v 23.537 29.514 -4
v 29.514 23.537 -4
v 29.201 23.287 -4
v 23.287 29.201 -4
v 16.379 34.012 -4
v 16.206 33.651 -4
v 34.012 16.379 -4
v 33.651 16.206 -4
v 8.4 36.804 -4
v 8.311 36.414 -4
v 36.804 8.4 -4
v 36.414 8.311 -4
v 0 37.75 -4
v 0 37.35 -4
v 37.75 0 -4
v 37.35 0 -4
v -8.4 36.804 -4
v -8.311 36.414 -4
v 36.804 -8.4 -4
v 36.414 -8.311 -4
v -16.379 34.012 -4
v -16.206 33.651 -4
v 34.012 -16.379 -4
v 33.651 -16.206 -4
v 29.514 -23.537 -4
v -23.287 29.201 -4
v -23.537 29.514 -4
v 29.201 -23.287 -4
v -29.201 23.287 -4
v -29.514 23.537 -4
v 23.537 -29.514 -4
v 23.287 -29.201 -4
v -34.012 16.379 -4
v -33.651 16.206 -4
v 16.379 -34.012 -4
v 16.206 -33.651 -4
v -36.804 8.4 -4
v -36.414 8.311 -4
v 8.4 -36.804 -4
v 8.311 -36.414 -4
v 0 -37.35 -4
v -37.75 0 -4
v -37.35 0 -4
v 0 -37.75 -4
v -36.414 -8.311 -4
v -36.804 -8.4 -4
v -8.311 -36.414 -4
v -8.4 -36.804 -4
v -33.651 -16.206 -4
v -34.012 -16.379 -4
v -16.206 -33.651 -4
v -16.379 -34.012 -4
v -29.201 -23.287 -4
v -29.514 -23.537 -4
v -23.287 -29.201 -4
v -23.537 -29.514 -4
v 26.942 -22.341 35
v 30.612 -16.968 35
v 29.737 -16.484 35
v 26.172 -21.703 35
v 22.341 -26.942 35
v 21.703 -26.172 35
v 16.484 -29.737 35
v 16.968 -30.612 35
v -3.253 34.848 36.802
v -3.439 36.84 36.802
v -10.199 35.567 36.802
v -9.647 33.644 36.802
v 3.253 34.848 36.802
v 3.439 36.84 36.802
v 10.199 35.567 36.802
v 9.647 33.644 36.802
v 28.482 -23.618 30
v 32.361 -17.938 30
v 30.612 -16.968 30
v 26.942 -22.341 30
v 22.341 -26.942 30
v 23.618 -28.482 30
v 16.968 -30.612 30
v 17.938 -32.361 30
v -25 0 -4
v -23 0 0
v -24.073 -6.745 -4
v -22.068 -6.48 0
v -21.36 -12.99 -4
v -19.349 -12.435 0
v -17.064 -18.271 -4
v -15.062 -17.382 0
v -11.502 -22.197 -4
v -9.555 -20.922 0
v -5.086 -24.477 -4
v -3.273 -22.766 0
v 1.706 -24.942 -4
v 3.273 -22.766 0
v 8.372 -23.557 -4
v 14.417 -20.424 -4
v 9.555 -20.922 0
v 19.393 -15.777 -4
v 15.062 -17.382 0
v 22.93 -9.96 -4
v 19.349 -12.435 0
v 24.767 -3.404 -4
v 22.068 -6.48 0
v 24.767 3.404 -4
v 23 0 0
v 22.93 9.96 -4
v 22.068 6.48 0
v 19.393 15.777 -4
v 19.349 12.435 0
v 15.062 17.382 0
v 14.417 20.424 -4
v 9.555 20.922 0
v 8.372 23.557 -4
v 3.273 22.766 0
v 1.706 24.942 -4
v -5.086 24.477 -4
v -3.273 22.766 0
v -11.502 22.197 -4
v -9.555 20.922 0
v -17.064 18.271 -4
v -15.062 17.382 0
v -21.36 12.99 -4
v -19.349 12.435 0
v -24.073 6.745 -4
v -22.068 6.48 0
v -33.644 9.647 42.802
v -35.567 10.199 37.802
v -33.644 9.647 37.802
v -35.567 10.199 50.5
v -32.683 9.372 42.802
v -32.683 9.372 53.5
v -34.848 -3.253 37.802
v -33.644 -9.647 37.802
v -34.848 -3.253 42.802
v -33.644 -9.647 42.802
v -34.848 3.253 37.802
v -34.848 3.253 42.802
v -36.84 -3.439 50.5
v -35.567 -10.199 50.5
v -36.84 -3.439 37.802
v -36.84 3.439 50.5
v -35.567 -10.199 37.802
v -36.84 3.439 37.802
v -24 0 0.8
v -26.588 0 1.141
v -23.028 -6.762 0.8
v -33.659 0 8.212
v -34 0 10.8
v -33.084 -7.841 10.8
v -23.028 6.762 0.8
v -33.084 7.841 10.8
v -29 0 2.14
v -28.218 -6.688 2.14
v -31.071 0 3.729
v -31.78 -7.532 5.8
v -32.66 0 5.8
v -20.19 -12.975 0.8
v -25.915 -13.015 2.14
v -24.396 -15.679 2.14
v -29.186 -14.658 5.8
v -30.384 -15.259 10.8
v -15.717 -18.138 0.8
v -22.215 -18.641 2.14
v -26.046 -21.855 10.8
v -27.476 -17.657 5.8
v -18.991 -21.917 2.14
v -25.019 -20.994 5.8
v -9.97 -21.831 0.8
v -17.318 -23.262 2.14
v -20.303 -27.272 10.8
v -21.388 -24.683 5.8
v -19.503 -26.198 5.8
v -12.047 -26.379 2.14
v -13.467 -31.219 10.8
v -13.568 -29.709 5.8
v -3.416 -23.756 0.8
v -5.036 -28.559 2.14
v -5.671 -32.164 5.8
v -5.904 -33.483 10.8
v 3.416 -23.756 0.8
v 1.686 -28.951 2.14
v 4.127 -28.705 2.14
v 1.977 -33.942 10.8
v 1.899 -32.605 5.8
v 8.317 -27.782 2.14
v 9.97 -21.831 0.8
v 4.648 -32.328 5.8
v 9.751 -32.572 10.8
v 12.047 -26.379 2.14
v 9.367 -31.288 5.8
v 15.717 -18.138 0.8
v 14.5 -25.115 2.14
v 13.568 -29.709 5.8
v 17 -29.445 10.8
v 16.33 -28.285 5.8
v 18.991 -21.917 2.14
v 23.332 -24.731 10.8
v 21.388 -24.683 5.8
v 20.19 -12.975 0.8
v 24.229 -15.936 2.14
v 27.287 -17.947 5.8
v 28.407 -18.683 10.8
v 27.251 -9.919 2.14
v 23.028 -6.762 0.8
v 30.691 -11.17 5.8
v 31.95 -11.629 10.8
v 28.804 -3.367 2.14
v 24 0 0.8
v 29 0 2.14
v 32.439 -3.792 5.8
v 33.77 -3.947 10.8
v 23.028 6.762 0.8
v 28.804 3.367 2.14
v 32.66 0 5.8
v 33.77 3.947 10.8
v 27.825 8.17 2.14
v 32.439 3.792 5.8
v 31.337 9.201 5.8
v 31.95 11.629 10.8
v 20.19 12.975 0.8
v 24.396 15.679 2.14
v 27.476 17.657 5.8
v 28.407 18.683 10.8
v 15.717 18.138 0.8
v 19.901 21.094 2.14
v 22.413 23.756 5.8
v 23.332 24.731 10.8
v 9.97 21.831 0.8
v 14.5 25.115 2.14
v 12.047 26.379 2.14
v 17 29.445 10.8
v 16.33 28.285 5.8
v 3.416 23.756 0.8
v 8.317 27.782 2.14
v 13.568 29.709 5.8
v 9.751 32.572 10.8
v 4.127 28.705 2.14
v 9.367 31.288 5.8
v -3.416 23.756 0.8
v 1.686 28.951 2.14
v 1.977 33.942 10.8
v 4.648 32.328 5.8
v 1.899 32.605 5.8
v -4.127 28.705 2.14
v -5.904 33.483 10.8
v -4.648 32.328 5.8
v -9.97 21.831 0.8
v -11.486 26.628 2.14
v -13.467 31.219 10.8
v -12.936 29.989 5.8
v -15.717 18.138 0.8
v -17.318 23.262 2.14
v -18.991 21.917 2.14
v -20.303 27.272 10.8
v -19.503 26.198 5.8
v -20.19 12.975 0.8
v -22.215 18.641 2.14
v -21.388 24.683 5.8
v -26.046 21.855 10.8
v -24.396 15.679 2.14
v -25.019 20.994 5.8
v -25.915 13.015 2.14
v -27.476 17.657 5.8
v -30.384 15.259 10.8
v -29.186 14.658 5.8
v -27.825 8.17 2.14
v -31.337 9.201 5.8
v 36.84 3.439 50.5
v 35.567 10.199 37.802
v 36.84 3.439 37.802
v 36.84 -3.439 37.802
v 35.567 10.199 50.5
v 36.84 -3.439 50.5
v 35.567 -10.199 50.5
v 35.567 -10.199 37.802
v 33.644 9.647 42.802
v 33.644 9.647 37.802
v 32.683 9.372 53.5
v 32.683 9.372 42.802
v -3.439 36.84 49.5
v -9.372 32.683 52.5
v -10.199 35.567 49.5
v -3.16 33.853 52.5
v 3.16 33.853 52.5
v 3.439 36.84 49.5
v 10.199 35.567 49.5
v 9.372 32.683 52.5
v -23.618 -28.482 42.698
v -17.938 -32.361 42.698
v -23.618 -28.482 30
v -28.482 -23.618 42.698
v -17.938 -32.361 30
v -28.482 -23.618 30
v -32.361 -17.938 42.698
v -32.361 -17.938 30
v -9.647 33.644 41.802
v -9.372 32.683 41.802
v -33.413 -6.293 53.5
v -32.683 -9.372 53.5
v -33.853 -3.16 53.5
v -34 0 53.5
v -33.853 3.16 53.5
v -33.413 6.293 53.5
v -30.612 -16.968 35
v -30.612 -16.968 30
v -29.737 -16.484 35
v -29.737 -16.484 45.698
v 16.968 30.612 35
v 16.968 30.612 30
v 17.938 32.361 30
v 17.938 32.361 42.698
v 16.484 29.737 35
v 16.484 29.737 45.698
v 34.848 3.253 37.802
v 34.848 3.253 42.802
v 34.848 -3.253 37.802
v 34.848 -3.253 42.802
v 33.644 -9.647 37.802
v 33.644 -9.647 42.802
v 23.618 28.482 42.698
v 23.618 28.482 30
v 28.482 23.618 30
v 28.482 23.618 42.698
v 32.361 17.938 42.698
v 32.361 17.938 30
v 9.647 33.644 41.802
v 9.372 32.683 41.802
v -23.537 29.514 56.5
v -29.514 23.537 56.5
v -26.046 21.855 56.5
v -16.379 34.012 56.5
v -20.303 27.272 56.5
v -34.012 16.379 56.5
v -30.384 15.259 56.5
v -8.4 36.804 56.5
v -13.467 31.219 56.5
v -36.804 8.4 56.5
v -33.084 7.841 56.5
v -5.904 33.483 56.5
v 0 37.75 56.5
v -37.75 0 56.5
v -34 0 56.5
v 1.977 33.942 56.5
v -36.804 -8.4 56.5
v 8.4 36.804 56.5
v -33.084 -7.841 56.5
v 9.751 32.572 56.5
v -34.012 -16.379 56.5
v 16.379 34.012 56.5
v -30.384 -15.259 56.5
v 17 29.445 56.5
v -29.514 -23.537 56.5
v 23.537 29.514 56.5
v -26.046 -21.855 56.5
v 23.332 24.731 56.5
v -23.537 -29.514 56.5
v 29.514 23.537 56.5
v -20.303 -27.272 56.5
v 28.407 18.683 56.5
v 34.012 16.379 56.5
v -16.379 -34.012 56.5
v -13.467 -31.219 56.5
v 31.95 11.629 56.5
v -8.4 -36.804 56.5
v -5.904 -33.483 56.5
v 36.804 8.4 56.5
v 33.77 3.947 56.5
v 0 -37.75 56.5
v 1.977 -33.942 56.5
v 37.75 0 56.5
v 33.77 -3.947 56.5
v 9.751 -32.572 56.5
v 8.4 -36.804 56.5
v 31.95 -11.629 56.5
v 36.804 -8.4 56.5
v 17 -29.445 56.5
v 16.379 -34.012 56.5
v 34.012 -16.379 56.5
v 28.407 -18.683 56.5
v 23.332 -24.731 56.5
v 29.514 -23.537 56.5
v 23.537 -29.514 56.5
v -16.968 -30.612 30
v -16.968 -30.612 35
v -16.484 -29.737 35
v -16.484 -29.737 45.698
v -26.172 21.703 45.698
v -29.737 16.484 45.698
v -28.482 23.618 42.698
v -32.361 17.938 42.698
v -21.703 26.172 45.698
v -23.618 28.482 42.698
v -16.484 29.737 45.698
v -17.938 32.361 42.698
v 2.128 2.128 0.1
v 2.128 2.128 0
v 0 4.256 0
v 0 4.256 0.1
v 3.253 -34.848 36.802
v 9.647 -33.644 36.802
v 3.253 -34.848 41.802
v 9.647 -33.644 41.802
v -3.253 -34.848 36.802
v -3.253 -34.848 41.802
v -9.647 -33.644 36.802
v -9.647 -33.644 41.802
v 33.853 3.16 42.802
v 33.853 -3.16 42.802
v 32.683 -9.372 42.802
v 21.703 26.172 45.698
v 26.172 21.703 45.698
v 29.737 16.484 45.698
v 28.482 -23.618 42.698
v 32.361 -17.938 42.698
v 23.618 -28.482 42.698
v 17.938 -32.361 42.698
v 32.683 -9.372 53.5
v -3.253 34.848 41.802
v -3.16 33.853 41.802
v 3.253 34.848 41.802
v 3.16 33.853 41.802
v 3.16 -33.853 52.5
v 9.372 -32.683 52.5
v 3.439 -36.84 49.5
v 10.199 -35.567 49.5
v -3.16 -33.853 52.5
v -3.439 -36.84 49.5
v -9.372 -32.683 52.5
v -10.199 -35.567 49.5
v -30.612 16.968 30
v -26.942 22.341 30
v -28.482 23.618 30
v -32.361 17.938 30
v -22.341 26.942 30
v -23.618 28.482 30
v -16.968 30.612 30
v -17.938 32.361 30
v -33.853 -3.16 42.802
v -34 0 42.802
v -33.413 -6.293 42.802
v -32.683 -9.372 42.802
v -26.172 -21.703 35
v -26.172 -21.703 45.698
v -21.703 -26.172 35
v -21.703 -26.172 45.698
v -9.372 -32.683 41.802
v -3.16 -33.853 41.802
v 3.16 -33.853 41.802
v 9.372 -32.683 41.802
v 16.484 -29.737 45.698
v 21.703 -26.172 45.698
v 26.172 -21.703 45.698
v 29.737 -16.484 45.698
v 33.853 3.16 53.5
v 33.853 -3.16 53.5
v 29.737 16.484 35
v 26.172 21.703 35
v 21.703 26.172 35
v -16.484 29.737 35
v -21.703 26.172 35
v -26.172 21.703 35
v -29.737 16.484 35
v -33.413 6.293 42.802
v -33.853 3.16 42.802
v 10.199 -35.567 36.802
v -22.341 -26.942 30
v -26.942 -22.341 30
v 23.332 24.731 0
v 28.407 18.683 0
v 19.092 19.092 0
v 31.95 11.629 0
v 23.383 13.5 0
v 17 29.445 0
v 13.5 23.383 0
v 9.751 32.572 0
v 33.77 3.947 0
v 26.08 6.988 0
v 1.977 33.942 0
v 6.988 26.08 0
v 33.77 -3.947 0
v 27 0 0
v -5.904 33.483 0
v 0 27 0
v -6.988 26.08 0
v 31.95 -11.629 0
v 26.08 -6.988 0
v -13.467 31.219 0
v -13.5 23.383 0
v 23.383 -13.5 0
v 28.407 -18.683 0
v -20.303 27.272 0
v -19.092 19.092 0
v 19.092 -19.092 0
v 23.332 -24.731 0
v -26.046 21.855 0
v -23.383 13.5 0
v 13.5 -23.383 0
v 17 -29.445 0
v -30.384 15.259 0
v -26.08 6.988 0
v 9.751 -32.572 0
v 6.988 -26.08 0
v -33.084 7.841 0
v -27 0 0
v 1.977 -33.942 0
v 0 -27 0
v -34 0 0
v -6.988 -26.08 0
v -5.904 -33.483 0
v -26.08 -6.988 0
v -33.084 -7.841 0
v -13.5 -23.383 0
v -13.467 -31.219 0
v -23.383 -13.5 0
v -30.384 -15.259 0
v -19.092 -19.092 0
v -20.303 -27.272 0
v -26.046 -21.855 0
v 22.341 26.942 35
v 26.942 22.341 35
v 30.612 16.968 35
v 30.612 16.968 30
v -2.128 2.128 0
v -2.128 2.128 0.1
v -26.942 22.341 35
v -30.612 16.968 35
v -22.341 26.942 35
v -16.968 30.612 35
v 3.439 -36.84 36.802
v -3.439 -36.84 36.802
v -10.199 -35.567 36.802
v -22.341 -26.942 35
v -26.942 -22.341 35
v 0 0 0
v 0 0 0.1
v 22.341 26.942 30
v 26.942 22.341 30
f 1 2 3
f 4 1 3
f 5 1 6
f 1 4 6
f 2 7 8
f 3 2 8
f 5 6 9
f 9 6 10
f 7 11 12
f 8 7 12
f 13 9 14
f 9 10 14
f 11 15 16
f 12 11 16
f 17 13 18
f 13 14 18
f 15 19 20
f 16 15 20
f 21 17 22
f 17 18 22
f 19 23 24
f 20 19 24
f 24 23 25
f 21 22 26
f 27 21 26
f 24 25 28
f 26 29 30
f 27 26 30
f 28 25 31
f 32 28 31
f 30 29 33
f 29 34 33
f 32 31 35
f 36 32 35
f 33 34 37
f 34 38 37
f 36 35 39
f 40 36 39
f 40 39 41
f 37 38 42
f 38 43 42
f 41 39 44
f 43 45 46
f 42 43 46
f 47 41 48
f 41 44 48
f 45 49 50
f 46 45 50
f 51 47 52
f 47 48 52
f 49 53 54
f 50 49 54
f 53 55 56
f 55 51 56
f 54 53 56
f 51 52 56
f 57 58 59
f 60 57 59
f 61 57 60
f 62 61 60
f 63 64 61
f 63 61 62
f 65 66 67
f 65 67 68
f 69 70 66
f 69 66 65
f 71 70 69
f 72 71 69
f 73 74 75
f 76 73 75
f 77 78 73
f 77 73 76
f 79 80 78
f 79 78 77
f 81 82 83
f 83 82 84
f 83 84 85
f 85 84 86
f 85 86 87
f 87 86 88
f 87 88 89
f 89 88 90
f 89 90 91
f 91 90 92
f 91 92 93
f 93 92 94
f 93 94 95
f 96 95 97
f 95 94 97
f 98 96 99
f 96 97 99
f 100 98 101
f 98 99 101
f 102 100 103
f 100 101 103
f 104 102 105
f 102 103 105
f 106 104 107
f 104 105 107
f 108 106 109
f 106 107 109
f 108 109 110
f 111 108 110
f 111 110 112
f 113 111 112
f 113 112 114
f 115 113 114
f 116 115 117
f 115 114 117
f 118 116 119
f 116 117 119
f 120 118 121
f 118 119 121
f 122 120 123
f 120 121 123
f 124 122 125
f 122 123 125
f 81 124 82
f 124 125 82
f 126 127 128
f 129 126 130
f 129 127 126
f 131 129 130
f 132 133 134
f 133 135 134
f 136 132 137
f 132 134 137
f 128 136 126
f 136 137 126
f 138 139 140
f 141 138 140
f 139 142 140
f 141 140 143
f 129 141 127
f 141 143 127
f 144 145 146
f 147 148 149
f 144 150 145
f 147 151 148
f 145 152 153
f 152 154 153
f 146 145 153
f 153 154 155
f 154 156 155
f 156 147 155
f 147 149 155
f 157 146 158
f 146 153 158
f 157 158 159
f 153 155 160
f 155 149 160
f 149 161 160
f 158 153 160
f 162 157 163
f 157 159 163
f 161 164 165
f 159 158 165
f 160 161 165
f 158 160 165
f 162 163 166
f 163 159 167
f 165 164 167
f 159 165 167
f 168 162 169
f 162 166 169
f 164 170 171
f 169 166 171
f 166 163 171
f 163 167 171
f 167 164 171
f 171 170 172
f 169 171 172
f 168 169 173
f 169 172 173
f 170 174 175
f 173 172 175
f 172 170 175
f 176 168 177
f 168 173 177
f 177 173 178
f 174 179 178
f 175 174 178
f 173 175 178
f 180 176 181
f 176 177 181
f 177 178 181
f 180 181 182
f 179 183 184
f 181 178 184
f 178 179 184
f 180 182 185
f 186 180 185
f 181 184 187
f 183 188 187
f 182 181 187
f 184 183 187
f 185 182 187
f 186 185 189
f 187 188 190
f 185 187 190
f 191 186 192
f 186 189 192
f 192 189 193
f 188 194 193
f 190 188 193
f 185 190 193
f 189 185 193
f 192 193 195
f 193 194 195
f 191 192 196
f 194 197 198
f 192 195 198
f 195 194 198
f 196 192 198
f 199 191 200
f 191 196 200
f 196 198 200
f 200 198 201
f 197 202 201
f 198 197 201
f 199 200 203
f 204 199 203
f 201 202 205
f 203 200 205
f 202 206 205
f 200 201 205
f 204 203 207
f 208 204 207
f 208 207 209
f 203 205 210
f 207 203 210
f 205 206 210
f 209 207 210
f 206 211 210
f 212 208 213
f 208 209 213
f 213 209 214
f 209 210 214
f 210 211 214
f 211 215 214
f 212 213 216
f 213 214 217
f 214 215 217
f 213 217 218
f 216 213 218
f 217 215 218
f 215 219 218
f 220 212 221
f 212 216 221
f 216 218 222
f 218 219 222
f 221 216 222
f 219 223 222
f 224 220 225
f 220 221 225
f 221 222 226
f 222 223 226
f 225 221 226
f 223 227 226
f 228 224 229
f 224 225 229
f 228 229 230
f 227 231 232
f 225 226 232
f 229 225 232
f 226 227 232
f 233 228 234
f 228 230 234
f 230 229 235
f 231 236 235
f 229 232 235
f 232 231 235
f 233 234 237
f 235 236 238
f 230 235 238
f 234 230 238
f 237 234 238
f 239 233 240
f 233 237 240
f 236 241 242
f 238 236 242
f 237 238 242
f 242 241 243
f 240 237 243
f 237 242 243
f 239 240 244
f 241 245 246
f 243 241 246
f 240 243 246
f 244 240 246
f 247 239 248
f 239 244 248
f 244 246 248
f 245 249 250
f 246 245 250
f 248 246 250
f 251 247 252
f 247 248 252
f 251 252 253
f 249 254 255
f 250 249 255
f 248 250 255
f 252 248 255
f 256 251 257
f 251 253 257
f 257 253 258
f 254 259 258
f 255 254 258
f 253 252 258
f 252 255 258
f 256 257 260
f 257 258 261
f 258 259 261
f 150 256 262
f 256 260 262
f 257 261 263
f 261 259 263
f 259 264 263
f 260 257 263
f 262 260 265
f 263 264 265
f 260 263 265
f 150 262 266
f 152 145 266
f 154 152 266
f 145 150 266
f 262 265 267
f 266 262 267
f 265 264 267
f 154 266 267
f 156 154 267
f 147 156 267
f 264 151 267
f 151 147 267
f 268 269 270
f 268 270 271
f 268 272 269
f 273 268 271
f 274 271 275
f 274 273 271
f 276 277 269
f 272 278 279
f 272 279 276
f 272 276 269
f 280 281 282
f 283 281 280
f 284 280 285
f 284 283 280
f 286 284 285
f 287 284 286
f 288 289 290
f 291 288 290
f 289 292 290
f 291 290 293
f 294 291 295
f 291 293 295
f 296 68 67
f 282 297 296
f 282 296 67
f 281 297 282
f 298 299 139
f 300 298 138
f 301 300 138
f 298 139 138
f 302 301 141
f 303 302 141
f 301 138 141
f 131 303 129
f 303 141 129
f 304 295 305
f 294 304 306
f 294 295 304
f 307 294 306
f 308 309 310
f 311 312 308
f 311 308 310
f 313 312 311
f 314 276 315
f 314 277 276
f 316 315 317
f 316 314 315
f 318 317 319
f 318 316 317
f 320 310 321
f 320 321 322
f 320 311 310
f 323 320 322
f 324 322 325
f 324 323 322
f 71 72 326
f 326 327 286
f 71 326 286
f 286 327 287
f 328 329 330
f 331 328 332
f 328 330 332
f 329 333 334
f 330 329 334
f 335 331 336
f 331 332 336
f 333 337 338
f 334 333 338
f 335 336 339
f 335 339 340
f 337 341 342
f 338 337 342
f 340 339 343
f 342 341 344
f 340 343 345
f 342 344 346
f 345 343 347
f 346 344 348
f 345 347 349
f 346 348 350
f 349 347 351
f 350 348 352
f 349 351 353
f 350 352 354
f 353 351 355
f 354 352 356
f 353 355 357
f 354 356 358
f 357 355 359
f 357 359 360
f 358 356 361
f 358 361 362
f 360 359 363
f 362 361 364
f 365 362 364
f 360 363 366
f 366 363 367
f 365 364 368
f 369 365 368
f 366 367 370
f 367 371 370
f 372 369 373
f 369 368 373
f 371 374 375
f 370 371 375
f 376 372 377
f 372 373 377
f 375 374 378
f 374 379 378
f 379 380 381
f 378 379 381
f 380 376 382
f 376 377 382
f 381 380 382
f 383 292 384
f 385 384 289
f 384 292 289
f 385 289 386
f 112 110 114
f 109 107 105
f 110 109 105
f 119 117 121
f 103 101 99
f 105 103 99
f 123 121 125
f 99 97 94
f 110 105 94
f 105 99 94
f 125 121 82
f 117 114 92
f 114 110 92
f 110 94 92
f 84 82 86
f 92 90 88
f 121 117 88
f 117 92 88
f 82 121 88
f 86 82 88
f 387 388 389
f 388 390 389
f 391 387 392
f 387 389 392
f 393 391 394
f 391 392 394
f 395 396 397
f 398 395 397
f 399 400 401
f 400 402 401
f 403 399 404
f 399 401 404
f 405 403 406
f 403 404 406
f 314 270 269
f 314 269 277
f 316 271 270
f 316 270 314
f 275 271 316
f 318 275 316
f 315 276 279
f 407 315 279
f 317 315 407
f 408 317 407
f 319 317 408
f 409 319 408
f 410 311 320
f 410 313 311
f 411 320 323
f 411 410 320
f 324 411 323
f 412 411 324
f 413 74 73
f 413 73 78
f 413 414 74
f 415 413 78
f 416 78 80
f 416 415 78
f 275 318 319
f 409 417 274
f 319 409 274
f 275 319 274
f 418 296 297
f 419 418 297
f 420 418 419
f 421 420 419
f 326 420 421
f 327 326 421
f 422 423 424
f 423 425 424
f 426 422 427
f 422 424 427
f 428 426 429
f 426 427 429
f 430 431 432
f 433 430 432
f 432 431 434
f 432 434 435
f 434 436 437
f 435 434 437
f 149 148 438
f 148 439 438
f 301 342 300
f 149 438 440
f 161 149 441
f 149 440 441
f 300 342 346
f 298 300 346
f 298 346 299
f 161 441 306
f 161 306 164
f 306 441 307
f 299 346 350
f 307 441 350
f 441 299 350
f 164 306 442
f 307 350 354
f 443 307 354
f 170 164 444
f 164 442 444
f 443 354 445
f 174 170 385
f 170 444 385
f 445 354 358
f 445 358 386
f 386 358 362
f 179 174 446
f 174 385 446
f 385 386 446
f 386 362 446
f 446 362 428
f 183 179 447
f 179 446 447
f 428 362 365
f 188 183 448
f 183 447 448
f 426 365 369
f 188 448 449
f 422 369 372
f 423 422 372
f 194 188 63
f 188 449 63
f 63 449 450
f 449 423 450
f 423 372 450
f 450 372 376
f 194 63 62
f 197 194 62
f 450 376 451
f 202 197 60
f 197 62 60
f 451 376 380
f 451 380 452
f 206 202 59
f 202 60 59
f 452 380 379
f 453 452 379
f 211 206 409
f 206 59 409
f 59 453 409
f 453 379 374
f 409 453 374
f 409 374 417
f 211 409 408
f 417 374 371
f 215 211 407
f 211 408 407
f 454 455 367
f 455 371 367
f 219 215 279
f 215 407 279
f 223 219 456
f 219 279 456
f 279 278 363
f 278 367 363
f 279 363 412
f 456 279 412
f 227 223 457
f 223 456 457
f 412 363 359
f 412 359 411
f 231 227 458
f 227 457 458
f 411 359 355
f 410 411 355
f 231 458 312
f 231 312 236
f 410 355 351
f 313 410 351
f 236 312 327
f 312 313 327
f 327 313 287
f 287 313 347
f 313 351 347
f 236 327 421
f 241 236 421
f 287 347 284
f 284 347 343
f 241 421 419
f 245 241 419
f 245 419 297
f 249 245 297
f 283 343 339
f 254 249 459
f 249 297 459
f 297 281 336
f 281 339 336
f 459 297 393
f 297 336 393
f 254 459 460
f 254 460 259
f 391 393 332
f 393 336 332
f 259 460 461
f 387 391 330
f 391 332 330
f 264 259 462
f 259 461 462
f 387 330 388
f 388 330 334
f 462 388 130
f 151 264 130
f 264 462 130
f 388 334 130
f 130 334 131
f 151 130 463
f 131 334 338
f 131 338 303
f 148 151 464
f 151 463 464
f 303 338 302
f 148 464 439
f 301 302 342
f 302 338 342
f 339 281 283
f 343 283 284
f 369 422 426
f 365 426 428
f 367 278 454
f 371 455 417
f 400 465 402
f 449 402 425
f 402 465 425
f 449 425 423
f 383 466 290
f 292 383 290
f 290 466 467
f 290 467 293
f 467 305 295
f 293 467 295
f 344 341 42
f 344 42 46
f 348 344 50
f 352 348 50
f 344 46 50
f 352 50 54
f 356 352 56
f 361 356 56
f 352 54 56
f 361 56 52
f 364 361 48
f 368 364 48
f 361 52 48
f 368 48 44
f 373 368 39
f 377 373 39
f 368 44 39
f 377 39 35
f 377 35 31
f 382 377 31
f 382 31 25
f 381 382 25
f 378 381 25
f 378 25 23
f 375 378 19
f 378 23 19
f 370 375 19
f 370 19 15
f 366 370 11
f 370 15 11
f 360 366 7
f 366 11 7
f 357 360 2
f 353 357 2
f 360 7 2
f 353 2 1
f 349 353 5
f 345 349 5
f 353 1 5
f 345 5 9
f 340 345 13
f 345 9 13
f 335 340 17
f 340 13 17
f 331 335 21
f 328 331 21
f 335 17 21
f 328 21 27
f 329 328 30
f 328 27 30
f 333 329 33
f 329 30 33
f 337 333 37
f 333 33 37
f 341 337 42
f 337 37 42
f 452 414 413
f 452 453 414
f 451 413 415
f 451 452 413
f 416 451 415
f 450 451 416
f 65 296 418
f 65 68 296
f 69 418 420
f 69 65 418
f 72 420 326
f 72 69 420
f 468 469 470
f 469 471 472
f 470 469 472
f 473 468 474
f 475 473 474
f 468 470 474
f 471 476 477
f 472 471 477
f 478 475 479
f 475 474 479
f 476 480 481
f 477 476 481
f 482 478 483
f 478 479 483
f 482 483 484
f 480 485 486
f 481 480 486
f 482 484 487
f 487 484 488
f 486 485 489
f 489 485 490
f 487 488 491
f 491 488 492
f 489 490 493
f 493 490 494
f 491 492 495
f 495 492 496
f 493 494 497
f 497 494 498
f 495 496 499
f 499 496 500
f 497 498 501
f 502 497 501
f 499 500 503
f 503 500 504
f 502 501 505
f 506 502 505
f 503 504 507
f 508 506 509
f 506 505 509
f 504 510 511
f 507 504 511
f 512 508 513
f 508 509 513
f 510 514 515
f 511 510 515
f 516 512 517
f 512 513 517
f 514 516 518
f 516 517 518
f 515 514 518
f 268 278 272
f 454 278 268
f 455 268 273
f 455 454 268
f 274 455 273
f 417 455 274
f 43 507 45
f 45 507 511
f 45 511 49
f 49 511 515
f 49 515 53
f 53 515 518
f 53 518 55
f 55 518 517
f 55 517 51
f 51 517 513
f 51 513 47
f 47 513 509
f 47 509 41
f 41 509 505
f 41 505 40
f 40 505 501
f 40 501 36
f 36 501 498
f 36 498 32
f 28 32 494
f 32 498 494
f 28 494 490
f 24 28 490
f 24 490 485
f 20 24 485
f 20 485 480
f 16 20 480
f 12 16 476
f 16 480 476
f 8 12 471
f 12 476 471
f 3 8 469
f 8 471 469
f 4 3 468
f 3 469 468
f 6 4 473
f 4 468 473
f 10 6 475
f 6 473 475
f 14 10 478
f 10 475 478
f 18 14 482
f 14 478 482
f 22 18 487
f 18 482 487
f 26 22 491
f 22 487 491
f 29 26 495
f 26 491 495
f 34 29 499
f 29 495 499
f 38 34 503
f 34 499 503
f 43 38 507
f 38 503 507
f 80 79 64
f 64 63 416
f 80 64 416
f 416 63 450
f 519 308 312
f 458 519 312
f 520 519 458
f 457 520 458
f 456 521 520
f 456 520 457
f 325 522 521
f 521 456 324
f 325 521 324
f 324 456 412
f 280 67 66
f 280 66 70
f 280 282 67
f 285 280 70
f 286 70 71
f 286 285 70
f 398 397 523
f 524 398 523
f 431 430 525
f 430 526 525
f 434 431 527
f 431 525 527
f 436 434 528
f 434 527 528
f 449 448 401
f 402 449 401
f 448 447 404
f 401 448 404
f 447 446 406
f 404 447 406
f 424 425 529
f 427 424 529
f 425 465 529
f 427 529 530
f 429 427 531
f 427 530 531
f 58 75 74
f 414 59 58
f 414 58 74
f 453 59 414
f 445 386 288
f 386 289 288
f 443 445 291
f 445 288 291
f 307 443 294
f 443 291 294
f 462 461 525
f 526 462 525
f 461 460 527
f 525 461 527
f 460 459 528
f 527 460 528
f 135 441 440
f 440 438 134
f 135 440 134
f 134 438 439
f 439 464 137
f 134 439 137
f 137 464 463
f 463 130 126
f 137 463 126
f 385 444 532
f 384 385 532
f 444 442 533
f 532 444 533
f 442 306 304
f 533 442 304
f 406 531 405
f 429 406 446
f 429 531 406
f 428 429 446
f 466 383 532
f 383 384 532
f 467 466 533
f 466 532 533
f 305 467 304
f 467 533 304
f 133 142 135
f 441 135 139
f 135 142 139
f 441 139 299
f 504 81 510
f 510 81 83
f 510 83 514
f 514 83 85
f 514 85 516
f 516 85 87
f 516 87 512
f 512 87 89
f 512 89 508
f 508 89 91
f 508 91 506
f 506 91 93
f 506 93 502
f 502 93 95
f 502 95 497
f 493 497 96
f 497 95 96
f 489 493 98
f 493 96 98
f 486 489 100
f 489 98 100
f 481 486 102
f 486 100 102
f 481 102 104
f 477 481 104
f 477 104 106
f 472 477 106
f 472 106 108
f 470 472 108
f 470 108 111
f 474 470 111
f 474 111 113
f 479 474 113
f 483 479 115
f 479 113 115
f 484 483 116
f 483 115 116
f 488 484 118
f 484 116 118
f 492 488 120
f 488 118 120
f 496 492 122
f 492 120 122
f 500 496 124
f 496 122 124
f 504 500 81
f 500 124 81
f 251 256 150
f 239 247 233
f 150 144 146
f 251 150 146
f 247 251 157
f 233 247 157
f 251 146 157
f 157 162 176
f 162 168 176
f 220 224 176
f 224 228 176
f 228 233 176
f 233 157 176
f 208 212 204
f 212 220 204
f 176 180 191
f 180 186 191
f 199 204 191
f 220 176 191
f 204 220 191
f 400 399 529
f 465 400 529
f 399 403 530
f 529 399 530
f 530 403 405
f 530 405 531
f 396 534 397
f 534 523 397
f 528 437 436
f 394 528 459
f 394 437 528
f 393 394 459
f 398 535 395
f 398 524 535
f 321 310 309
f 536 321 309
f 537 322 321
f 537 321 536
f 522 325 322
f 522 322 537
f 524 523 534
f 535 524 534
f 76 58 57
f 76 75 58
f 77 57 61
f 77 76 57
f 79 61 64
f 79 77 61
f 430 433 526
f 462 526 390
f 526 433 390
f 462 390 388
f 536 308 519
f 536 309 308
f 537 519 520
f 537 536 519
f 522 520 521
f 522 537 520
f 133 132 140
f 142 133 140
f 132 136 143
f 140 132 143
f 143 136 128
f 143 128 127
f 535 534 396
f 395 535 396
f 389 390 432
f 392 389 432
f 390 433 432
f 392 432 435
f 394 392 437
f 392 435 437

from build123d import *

# Parameters (mm, degrees)
F2_ANGLE_BACK  = 16
F2_ANGLE       = 32
F4_ANGLE_BACK  = 16
F4_ANGLE       = 32
F6_DEPTH       = 0.1
F8_ANGLE_BACK  = 16
F8_ANGLE       = 32
F10_ANGLE_BACK = 16
F10_ANGLE      = 32


with BuildPart() as f1:
    # F0 (on Front) → F1 (revolve)
    with BuildSketch(Plane.XZ):
        Polygon((-35, 42.8018823761), (-34, 42.8018823761), (-34, 44.8018823761), (-34, 48.5), (-34, 53), (-34, 53.5), (-37, 50.5), (-37, 48.5), (-37, 37.8018823761), (-35, 37.8018823761), (-35, 41.8022545199), align=None)
        Polygon((-37.35, -4), (-34, 0), (-34, 0.8), (-34, 10.8), (-34, 21), (-34, 36.8018823761), (-34, 37.8018823761), (-34, 42.8018823761), (-35, 42.8018823761), (-35, 41.8022545199), (-35, 37.8018823761), (-37, 37.8018823761), (-37, 48.5), (-37, 50.5), (-34, 53.5), (-34, 54.5), (-34, 56.5), (-37.75, 56.5), (-37.75, -4), align=None)
        Polygon((0, 0.8), (-24, 0.8), (-24, 0), (-23, 0), (0, 0), align=None)
        Polygon((-24, 0), (-27, 0), (-25, -4), (-23, 0), align=None)
        with BuildLine():
            Line((-34, 10.8), (-34, 0.8))
            Line((-34, 0.8), (-24, 0.8))
            ThreePointArc((-24, 0.8), (-31.0710678119, 3.7289321881), (-34, 10.8))
        make_face()
        Polygon((-34, 0.8), (-34, 0), (-27, 0), (-24, 0), (-24, 0.8), align=None)
    revolve(axis=Axis((0, 0, 27.5), (0, 0, 1)))

    # F0 (on Front) → F2 (revolve, cut)
    with BuildSketch(Plane.XZ, mode=Mode.PRIVATE) as f2_sk:
        Polygon((-35, 42.8018823761), (-34, 42.8018823761), (-34, 44.8018823761), (-34, 48.5), (-34, 53), (-34, 53.5), (-37, 50.5), (-37, 48.5), (-37, 37.8018823761), (-35, 37.8018823761), (-35, 41.8022545199), align=None)
        Polygon((35, 37.802), (37, 37.802), (37, 39.8018823761), (37, 48.5001176239), (37, 50.5001176239), (34, 53.5001176239), (34, 53.0001176239), (34, 48.5001176239), (34, 42.802), (35, 42.802), (35, 41.8023721437), align=None)
    revolve(f2_sk.sketch.rotate(Axis((0, 0, 27.5), (0, 0, -1)), -F2_ANGLE_BACK), axis=Axis((0, 0, 27.5), (0, 0, -1)), revolution_arc=F2_ANGLE, mode=Mode.SUBTRACT)

    # F3 (on Right) → F4 (revolve, cut)
    with BuildSketch(Plane.YZ, mode=Mode.PRIVATE) as f4_sk:
        Polygon((-34, 52.0001176239), (-34, 52.5001176239), (-37, 49.5001176239), (-37, 47.5001176239), (-37, 36.802), (-35, 36.802), (-35, 40.8023721437), (-35, 41.802), (-34, 41.802), (-34, 47.5001176239), align=None)
        Polygon((37, 49.5001176239), (34, 52.5001176239), (34, 52.0001176239), (34, 47.5001176239), (34, 41.802), (35, 41.802), (35, 40.8023721437), (35, 36.802), (37, 36.802), (37, 39.8018823761), (37, 47.5001176239), align=None)
    revolve(f4_sk.sketch.rotate(Axis((0, 0, 27.5), (0, 0, -1)), -F4_ANGLE_BACK), axis=Axis((0, 0, 27.5), (0, 0, -1)), revolution_arc=F4_ANGLE, mode=Mode.SUBTRACT)

    # F7 (on face) → F8 (revolve, cut)
    with BuildSketch(Plane(origin=(0, 0, 0), x_dir=(0.7071067812, 0.7071067812, 0), z_dir=(0.7071067812, -0.7071067812, 0)), mode=Mode.PRIVATE) as f8_sk:
        Polygon((-34, 45.1981176239), (-34, 45.6981176239), (-37, 42.6981176239), (-37, 40.6981176239), (-37, 30), (-35, 30), (-35, 34.0003721437), (-35, 35), (-34, 35), (-34, 40.6981176239), align=None)
        Polygon((35, 30), (37, 30), (37, 40.6981176239), (37, 42.6981176239), (34, 45.6981176239), (34, 45.1981176239), (34, 40.6981176239), (34, 35), (35, 35), (35, 34.0003721437), align=None)
    revolve(f8_sk.sketch.rotate(Axis((0, 0, 27.5), (0, 0, -1)), -F8_ANGLE_BACK), axis=Axis((0, 0, 27.5), (0, 0, -1)), revolution_arc=F8_ANGLE, mode=Mode.SUBTRACT)

    # F9 (on face) → F10 (revolve, cut)
    with BuildSketch(Plane(origin=(0, 0, 0), x_dir=(0.7071067812, -0.7071067812, 0), z_dir=(-0.7071067812, -0.7071067812, 0)), mode=Mode.PRIVATE) as f10_sk:
        Polygon((-34, 45.1981176239), (-34, 45.6981176239), (-37, 42.6981176239), (-37, 40.6981176239), (-37, 30), (-35, 30), (-35, 34.0003721437), (-35, 35), (-34, 35), (-34, 40.6981176239), align=None)
        Polygon((35, 30), (37, 30), (37, 40.6981176239), (37, 42.6981176239), (34, 45.6981176239), (34, 45.1981176239), (34, 40.6981176239), (34, 35), (35, 35), (35, 34.0003721437), align=None)
    revolve(f10_sk.sketch.rotate(Axis((0, 0, 27.5), (0, 0, -1)), -F10_ANGLE_BACK), axis=Axis((0, 0, 27.5), (0, 0, -1)), revolution_arc=F10_ANGLE, mode=Mode.SUBTRACT)


with BuildPart() as f6:
    # F5 (on Top) → F6 (new body)
    with BuildSketch(Plane.XY):
        Polygon((0, 0), (2.1277666092, 2.1277666092), (0, 4.2555332184), align=None)
        Polygon((-2.1277666092, 2.1277666092), (0, 0), (0, 4.2555332184), align=None)
    extrude(amount=F6_DEPTH)


solid = Compound([f1.part, f6.part])
